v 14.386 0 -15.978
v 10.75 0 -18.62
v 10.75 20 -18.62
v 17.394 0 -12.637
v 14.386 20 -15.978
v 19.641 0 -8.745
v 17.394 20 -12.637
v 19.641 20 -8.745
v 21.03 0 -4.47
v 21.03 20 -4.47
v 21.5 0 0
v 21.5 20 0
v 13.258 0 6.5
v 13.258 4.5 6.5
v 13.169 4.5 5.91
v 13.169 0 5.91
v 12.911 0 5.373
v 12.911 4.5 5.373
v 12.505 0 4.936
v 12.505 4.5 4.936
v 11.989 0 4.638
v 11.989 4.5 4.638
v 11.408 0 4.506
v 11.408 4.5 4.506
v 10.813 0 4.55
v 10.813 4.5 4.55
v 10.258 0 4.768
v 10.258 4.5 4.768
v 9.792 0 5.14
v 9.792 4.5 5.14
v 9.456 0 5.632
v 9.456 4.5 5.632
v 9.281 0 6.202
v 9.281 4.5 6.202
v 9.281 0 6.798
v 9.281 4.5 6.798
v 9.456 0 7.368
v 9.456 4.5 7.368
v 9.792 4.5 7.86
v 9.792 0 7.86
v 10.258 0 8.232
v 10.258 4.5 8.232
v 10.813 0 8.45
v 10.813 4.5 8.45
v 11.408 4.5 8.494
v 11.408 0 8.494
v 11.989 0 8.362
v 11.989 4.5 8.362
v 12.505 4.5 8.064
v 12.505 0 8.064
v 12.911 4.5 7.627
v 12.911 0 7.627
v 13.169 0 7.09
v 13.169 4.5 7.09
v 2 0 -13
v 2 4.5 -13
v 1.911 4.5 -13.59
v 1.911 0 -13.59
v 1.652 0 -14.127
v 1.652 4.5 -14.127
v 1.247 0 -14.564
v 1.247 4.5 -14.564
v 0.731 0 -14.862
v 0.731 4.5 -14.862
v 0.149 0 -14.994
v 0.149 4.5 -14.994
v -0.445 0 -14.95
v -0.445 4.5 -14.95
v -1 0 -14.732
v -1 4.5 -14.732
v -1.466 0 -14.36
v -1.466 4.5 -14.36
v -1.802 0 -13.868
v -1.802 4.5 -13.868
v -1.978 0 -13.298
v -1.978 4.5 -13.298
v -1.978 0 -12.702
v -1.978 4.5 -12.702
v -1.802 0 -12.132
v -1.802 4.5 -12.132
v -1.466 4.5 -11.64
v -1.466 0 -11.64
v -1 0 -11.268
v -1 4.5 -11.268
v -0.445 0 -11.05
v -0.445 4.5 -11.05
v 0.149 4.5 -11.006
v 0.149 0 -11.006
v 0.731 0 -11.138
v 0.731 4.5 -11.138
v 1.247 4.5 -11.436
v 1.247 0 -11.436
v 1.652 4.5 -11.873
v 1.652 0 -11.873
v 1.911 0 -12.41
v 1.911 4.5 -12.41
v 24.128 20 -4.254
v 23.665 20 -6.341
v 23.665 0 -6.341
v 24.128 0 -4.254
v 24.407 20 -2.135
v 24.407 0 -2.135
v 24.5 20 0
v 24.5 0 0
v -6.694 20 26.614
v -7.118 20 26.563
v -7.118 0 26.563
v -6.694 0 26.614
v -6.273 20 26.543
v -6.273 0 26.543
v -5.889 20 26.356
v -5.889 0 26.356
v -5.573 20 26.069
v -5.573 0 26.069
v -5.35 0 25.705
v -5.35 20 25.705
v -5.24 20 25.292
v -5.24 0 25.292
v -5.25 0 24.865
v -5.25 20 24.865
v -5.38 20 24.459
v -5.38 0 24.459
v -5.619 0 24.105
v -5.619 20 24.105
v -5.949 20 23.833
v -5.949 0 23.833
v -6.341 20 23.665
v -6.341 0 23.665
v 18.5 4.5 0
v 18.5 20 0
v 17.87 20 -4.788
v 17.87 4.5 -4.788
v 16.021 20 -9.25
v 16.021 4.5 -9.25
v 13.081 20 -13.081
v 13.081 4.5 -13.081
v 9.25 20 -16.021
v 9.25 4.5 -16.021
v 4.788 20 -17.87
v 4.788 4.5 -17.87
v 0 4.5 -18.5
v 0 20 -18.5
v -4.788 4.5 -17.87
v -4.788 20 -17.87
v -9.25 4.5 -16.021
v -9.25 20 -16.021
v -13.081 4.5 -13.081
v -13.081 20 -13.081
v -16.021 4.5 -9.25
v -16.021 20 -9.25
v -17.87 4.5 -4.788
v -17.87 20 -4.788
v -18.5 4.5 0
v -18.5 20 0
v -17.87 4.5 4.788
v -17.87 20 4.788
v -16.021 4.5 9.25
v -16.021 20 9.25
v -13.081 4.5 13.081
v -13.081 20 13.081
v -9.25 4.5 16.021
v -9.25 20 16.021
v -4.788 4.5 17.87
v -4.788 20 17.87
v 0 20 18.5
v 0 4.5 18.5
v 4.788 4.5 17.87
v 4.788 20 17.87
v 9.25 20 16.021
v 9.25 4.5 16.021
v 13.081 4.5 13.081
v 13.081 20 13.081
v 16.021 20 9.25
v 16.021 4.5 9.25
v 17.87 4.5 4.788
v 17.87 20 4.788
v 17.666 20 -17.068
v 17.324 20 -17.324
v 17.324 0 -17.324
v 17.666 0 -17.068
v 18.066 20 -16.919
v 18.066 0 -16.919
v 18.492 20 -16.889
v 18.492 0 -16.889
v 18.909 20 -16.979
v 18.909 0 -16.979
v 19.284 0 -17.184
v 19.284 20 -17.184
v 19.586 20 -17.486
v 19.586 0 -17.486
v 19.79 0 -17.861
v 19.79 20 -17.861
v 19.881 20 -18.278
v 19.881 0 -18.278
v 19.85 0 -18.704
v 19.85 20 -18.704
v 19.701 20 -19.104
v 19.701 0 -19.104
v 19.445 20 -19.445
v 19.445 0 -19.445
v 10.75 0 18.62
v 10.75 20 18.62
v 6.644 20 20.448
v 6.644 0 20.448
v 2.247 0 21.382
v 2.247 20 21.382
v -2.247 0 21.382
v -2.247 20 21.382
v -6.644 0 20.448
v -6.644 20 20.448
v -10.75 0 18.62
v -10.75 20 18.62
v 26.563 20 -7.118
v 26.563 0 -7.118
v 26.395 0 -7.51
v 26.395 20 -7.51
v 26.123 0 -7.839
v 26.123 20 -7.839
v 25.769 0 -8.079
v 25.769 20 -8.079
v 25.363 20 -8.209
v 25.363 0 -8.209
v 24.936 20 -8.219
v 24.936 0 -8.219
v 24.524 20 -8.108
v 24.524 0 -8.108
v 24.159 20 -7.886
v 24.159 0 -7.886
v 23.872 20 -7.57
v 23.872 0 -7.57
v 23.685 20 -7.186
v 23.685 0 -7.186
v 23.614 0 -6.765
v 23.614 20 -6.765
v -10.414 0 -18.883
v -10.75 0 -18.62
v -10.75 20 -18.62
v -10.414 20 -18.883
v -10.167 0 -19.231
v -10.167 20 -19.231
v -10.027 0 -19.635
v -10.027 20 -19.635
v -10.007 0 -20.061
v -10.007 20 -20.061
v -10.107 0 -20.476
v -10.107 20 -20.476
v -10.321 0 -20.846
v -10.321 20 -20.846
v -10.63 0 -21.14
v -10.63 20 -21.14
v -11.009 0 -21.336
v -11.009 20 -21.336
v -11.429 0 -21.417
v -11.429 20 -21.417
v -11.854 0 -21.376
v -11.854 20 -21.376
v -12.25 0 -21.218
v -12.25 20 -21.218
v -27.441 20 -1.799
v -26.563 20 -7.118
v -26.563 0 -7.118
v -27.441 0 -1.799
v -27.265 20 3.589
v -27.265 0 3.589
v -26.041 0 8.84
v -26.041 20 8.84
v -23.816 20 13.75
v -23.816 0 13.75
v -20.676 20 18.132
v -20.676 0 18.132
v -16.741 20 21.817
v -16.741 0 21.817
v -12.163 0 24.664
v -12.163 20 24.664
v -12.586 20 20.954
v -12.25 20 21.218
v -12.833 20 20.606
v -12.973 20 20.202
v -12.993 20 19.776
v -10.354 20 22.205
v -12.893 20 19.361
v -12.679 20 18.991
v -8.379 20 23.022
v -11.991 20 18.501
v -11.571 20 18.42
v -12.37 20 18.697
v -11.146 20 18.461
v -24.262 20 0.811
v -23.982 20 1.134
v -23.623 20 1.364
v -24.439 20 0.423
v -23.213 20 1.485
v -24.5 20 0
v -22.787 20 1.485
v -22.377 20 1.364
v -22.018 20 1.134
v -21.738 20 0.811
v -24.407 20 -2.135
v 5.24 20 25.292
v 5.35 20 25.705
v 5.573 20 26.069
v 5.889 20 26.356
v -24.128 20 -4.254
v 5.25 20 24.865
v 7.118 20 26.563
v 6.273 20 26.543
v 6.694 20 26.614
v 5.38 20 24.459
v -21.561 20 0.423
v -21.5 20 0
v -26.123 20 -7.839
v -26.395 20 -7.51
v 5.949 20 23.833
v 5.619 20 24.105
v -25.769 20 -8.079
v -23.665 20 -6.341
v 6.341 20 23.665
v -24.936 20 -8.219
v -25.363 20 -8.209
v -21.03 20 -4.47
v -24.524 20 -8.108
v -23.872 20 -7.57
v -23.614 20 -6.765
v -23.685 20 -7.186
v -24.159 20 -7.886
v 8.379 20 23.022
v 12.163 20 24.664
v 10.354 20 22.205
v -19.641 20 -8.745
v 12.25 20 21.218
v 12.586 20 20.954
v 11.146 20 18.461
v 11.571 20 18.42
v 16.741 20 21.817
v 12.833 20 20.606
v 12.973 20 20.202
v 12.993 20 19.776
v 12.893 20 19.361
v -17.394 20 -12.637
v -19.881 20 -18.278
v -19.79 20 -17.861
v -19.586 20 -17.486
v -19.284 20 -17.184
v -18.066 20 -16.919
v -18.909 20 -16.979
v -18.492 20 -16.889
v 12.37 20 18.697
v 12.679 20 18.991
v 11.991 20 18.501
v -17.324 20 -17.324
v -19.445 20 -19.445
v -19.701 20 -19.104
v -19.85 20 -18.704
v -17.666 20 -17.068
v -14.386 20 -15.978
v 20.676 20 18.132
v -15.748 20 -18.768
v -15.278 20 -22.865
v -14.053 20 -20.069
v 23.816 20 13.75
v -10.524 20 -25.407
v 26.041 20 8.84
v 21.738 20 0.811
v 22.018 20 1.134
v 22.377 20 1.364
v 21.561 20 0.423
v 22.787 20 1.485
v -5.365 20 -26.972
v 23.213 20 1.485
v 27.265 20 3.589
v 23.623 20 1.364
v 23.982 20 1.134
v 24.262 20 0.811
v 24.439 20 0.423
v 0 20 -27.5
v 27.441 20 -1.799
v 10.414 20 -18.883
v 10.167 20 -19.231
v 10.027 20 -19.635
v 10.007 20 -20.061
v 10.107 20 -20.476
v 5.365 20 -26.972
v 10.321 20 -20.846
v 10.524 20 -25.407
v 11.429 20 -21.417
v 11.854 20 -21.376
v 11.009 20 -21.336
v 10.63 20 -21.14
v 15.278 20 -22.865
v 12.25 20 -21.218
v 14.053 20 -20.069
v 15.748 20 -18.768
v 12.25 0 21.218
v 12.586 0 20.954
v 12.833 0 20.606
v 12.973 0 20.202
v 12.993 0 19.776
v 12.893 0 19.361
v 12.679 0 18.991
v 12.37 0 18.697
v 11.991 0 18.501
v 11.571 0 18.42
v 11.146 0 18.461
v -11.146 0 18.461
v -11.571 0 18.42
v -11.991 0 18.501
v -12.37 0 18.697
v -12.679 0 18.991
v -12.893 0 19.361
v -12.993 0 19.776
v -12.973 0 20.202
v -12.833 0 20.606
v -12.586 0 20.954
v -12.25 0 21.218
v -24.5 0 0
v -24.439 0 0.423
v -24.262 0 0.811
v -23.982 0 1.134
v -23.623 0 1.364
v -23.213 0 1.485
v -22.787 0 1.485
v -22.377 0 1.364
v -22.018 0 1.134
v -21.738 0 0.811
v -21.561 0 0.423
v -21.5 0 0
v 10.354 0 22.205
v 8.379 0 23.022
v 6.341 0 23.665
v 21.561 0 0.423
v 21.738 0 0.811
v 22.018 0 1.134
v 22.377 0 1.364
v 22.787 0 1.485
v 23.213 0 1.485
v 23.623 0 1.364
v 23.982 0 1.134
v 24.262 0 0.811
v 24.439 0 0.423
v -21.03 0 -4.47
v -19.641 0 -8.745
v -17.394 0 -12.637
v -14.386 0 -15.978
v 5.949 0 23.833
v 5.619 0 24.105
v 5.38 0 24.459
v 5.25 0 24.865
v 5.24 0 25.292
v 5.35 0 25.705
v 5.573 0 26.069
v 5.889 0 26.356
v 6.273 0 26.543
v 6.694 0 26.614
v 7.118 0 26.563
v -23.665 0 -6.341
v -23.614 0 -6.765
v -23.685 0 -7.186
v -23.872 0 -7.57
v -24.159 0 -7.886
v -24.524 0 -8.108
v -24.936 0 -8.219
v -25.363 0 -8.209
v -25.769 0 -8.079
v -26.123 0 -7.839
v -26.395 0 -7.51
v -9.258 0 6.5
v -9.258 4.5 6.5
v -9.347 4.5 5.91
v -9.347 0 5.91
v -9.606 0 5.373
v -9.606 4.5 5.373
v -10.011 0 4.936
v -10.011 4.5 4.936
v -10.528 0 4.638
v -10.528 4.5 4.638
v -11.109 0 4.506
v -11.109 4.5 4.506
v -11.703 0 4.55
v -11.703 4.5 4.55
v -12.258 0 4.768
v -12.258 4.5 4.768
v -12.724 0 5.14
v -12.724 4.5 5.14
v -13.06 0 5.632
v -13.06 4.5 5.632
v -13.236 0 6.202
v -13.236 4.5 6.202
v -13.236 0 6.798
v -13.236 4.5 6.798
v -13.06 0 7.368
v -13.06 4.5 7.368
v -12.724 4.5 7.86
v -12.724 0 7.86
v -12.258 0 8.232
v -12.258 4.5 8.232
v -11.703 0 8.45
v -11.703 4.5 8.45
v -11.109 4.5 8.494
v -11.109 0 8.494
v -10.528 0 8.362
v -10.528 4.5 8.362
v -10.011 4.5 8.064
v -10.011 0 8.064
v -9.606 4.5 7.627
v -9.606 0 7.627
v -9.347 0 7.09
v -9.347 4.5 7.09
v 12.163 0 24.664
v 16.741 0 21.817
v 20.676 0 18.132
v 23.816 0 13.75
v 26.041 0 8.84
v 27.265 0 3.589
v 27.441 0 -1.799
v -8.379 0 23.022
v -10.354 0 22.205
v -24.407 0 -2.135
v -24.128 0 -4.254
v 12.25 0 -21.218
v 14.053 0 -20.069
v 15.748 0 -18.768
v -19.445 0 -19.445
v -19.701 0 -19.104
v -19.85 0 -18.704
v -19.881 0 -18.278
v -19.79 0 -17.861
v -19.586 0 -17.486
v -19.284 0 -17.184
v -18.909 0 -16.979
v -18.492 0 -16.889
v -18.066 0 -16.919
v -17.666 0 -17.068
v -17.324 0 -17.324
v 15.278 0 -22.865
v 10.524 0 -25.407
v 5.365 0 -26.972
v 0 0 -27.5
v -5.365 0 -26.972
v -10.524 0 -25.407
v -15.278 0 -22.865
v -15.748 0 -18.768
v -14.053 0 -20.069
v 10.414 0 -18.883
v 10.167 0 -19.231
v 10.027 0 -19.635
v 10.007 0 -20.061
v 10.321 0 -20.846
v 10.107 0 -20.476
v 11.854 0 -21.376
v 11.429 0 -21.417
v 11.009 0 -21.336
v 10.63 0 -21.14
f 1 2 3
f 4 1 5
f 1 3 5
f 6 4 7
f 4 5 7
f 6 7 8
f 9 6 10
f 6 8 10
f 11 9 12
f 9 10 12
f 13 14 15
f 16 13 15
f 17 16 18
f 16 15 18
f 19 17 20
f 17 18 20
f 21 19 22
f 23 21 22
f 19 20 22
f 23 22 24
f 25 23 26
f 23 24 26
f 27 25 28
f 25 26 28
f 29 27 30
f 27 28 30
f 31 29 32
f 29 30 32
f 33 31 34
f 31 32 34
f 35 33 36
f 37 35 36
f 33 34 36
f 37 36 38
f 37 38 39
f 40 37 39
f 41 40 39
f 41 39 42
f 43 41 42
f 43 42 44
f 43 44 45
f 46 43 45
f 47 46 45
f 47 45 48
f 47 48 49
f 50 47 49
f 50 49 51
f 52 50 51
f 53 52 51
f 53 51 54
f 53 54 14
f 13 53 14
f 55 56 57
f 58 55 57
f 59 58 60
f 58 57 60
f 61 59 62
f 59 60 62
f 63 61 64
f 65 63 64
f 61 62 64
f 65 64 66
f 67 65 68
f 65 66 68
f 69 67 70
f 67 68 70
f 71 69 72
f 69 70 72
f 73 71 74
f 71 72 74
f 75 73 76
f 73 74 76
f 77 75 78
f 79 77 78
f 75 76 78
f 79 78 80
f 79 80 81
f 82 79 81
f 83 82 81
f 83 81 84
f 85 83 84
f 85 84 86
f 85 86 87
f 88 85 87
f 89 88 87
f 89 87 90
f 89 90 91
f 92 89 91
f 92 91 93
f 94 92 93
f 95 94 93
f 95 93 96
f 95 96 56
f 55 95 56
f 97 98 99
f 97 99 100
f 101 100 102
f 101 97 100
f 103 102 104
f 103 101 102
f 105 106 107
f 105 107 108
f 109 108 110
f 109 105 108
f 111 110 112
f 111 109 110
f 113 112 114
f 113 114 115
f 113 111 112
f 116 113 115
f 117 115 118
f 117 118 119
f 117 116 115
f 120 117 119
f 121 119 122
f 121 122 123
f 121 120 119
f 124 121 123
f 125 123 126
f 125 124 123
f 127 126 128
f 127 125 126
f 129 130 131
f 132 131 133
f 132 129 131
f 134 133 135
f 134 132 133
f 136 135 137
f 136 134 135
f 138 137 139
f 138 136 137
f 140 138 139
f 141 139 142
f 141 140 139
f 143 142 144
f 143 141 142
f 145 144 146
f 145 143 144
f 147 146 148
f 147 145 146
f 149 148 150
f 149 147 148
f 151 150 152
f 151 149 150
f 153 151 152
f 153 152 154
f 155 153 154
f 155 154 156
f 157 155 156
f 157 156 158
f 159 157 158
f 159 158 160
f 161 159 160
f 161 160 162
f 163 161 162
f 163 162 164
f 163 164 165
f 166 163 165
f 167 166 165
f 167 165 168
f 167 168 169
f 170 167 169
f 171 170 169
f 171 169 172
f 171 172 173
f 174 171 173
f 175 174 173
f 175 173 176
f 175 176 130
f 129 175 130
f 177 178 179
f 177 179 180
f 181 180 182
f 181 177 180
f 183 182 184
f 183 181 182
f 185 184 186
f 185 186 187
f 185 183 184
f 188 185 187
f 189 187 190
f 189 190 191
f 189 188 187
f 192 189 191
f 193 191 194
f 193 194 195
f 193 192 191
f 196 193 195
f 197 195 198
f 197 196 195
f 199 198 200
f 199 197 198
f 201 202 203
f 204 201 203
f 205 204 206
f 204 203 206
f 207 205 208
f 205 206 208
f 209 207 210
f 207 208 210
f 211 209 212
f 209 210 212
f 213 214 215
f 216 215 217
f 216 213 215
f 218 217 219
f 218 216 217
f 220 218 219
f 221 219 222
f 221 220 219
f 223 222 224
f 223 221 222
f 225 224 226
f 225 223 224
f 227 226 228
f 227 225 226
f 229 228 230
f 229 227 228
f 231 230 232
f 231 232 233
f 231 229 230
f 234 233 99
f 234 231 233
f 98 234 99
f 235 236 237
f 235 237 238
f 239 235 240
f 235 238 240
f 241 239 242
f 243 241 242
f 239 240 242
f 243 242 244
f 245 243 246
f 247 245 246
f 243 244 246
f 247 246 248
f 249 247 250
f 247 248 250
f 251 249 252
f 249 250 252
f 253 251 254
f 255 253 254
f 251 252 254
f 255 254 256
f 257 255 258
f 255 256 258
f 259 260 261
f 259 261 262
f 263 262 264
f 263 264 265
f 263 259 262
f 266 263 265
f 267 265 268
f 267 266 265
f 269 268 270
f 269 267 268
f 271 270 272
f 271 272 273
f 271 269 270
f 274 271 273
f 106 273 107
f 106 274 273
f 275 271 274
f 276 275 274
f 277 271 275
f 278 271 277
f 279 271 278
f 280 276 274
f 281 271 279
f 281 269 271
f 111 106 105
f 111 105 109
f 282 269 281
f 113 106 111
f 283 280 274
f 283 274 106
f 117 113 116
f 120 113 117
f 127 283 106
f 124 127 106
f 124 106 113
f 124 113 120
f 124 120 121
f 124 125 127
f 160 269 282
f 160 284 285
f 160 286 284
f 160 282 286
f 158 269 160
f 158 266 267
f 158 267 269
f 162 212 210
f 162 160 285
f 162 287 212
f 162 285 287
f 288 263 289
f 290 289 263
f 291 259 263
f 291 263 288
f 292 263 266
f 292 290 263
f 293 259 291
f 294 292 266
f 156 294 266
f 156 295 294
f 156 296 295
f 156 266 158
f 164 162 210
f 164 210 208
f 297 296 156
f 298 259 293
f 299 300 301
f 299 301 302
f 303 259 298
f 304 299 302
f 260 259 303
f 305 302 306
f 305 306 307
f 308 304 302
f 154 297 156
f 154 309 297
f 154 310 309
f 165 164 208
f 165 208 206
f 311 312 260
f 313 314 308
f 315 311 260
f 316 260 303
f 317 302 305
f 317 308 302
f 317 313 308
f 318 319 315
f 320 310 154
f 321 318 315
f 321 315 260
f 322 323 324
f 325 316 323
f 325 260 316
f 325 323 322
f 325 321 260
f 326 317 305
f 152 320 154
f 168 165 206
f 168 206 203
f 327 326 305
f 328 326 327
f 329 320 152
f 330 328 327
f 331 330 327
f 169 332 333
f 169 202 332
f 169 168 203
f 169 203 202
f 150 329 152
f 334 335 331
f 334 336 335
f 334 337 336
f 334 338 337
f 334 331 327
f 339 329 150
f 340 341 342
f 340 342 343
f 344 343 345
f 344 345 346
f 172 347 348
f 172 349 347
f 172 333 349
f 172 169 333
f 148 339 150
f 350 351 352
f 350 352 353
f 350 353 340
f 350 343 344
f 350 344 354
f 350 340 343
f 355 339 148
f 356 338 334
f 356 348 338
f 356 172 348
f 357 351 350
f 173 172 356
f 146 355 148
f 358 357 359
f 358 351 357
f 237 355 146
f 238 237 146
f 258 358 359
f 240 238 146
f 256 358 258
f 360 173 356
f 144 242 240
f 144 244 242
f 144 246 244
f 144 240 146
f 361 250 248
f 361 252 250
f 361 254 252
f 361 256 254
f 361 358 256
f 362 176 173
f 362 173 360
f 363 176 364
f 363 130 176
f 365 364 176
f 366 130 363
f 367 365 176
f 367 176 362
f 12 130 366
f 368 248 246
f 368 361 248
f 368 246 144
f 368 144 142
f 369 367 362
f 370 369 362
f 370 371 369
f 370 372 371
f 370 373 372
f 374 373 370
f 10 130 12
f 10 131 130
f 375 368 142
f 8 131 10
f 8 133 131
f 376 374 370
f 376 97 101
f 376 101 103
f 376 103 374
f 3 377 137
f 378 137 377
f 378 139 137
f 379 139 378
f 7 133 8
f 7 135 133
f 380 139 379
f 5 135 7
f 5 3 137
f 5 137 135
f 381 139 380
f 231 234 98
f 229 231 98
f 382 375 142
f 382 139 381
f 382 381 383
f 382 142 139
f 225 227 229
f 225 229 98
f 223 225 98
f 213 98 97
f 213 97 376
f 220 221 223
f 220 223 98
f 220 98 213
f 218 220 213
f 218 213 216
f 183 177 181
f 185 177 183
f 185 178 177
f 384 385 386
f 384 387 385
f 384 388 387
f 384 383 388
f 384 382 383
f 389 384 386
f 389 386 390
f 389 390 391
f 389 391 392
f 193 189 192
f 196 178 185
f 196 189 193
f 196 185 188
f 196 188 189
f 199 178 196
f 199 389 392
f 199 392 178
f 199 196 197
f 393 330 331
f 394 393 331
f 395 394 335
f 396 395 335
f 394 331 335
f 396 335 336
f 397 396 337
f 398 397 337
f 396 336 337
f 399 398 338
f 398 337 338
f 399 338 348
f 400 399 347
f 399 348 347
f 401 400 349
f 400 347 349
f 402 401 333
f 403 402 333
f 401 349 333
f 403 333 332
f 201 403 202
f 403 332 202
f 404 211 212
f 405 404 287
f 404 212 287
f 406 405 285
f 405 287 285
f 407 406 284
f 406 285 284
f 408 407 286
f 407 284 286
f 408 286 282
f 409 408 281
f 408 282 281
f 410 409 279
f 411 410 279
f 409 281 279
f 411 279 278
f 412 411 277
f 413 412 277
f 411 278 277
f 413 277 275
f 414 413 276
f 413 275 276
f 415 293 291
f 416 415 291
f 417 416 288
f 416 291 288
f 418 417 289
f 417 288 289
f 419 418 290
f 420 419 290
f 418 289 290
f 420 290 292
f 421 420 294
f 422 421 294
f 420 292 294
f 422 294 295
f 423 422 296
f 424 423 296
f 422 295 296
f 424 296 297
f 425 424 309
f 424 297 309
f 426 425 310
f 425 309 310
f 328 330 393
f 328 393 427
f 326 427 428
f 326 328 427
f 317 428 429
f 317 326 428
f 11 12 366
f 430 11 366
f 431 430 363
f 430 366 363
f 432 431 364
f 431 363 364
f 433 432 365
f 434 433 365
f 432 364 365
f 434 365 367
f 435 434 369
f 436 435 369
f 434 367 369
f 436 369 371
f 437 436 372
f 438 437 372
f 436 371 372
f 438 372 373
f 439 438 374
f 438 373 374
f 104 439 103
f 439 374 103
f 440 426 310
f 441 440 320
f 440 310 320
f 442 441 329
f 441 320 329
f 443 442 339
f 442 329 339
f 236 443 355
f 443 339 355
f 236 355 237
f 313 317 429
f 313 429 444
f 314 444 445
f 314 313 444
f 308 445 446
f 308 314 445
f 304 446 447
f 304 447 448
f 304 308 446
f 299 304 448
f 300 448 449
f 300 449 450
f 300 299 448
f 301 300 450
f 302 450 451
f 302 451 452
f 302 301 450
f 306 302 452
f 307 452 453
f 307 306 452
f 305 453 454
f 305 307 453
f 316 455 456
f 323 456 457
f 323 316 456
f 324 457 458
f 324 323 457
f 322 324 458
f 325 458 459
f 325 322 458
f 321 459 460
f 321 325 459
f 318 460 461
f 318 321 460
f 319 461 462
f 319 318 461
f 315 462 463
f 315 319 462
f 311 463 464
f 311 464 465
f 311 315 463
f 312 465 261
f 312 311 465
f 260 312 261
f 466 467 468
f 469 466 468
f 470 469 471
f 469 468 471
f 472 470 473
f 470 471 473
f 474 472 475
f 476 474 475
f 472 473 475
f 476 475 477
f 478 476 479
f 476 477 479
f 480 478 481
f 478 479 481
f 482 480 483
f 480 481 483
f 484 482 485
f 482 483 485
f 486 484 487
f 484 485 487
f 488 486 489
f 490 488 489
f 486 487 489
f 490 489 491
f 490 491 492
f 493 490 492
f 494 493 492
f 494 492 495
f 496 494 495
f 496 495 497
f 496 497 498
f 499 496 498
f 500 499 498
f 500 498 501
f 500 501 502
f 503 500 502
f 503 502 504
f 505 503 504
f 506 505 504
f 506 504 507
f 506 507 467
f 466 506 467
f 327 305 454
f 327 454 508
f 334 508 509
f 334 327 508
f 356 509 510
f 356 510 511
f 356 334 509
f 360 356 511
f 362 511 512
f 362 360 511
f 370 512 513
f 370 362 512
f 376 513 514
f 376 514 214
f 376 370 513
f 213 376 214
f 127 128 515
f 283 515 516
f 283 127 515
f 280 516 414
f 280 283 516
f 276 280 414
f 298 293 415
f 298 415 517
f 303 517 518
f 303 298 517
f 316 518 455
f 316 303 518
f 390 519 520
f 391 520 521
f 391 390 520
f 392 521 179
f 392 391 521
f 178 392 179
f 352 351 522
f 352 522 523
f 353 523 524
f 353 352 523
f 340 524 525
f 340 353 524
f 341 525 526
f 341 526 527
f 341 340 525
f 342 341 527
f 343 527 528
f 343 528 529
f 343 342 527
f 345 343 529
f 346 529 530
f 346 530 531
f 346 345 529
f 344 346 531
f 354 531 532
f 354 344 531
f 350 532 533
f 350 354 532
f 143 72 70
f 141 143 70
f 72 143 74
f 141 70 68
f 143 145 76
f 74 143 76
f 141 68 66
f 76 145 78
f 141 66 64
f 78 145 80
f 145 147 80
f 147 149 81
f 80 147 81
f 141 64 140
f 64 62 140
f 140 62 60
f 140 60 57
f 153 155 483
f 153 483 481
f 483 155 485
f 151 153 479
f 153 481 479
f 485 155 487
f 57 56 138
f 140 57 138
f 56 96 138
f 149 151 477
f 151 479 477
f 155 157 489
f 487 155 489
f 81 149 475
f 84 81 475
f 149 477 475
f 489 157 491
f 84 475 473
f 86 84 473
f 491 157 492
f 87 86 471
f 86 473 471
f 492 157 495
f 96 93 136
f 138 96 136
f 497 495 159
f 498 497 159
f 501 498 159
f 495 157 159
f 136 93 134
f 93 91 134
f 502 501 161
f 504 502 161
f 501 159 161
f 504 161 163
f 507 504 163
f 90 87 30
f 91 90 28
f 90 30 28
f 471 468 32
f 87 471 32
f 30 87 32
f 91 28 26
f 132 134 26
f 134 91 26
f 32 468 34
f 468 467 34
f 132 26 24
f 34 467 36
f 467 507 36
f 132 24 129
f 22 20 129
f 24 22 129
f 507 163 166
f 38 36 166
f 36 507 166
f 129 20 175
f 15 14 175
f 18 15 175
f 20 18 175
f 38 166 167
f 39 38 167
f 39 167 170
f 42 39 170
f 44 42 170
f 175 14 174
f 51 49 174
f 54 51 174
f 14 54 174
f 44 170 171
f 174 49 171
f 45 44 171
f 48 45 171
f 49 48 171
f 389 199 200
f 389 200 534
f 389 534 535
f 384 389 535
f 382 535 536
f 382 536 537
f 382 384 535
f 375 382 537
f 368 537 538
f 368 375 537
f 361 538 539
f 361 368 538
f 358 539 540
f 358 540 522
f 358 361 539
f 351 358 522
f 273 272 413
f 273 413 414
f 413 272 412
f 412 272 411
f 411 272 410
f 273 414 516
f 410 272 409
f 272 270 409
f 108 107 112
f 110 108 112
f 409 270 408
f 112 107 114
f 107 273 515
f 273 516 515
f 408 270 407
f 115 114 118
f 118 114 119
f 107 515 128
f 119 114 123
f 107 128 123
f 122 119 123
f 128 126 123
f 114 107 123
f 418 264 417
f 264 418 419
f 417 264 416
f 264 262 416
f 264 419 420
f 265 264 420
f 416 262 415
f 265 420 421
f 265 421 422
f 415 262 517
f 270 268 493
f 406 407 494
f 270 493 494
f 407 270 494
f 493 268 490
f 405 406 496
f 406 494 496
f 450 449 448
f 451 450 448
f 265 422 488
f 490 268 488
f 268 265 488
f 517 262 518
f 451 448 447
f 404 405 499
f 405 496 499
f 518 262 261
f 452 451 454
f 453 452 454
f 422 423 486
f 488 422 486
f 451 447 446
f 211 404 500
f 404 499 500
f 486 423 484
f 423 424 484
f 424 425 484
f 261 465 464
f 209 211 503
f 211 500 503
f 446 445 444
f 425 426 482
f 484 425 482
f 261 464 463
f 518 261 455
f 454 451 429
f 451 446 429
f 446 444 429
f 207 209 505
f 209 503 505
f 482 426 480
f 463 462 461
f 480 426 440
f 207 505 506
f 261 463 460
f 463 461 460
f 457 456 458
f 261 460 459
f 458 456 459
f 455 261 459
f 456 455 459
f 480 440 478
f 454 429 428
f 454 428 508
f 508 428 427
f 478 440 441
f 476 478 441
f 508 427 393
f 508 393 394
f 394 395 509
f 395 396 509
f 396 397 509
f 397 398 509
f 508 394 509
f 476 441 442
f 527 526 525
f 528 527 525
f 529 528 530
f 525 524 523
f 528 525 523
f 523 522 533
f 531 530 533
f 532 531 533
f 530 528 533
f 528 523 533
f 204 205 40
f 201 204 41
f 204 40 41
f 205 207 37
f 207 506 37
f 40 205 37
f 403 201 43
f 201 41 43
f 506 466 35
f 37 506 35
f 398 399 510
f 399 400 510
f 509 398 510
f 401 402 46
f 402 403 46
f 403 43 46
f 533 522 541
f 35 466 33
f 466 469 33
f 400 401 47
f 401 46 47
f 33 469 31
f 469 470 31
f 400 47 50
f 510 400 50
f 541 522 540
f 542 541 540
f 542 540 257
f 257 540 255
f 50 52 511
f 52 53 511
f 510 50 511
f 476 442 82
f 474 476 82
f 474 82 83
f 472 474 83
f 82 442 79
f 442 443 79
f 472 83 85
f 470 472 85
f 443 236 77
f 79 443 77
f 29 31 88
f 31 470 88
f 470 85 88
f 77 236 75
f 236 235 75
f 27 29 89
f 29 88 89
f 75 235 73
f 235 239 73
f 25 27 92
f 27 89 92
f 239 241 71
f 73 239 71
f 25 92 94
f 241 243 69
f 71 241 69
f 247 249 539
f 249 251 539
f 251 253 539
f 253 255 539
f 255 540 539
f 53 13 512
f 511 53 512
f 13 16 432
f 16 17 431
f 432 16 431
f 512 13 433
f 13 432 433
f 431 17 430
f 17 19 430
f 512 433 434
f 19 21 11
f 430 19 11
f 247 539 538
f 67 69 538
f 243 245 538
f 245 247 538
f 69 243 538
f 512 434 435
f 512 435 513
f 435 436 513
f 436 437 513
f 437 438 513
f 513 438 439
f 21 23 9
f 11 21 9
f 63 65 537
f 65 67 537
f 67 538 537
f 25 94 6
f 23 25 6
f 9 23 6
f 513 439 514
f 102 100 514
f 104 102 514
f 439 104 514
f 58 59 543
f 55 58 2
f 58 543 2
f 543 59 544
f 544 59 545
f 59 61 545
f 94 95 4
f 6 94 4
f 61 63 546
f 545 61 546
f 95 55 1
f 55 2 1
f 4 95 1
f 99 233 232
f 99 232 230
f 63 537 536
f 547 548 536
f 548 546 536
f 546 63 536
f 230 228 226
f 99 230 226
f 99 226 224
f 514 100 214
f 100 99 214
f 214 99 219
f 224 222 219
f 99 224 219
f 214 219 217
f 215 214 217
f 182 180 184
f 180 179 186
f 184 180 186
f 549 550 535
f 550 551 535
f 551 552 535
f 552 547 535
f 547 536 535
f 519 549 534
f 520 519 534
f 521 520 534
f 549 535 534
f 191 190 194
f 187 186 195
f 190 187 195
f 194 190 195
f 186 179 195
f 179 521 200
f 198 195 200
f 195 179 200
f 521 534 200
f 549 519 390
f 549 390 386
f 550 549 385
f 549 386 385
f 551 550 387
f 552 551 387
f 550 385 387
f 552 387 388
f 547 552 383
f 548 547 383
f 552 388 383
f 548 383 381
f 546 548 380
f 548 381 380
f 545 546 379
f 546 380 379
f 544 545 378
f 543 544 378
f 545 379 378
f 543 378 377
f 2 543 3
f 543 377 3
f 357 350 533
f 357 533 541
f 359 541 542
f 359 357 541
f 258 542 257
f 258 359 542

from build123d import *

# Parameters (mm, degrees)
ESQUISSE1_R             = 24.5
ESQUISSE1_R_2           = 18.5
BOSS_EXTRU_1_DEPTH      = 20
ENL_V_MAT_EXTRU_1_DEPTH = 21
BOSS_EXTRU_2_DEPTH      = 20
ESQUISSE4_R             = 21.5
BOSS_EXTRU_3_DEPTH      = 4.5
ENL_V_MAT_EXTRU_2_REACH = 6.5
ESQUISSE5_R             = 2


with BuildPart() as part:
    # Esquisse1 → Boss.-Extru.1 (new body)
    with BuildSketch(Plane(origin=(0, 0, 0), x_dir=(1, 0, 0), z_dir=(0, 1, 0))):
        Circle(ESQUISSE1_R)
        Circle(ESQUISSE1_R_2, mode=Mode.SUBTRACT)
    extrude(amount=BOSS_EXTRU_1_DEPTH)

    # Esquisse2 → Enlèv. mat.-Extru.1 (cut, through all)
    with BuildSketch(Plane(origin=(0, 20, 0), x_dir=(1, 0, 0), z_dir=(0, 1, 0))):
        with BuildLine():
            ThreePointArc((-12.25, 21.217622393), (-21.217622393, 12.25), (-24.5, 0))
            ThreePointArc((-24.5, 0), (-23, -1.5), (-21.5, 0))
            ThreePointArc((-21.5, 0), (-18.619546181, 10.75), (-10.75, 18.619546181))
            ThreePointArc((-10.75, 18.619546181), (-10.200961894, 20.668584287), (-12.25, 21.217622393))
        make_face()
        with BuildLine():
            ThreePointArc((24.5, 0), (21.217622393, 12.25), (12.25, 21.217622393))
            ThreePointArc((12.25, 21.217622393), (10.200961894, 20.668584287), (10.75, 18.619546181))
            ThreePointArc((10.75, 18.619546181), (18.619546181, 10.75), (21.5, 0))
            ThreePointArc((21.5, 0), (23, -1.5), (24.5, 0))
        make_face()
        with BuildLine():
            ThreePointArc((-12.25, -21.217622393), (0, -24.5), (12.25, -21.217622393))
            ThreePointArc((12.25, -21.217622393), (12.799038106, -19.168584287), (10.75, -18.619546181))
            ThreePointArc((10.75, -18.619546181), (0, -21.5), (-10.75, -18.619546181))
            ThreePointArc((-10.75, -18.619546181), (-12.799038106, -19.168584287), (-12.25, -21.217622393))
        make_face()
    extrude(amount=-ENL_V_MAT_EXTRU_1_DEPTH, mode=Mode.SUBTRACT)

    # Esquisse3 → Boss.-Extru.2 (add)
    with BuildSketch(Plane(origin=(0, 20, 0), x_dir=(1, 0, 0), z_dir=(0, 1, 0))):
        with BuildLine():
            ThreePointArc((19.445436483, 19.445436483), (0, 27.5), (-19.445436483, 19.445436483))
            ThreePointArc((-19.445436483, 19.445436483), (-19.445436483, 17.324116139), (-17.324116139, 17.324116139))
            ThreePointArc((-17.324116139, 17.324116139), (0, 24.5), (17.324116139, 17.324116139))
            ThreePointArc((17.324116139, 17.324116139), (19.445436483, 17.324116139), (19.445436483, 19.445436483))
        make_face()
        with BuildLine():
            ThreePointArc((7.11752374, -26.562960223), (23.815698604, -13.75), (26.562960223, 7.11752374))
            ThreePointArc((26.562960223, 7.11752374), (24.725842916, 8.178183912), (23.665182744, 6.341066605))
            ThreePointArc((23.665182744, 6.341066605), (21.217622393, -12.25), (6.341066605, -23.665182744))
            ThreePointArc((6.341066605, -23.665182744), (5.280406433, -25.502300051), (7.11752374, -26.562960223))
        make_face()
        with BuildLine():
            ThreePointArc((-26.562960223, 7.11752374), (-23.815698604, -13.75), (-7.11752374, -26.562960223))
            ThreePointArc((-7.11752374, -26.562960223), (-5.280406433, -25.502300051), (-6.341066605, -23.665182744))
            ThreePointArc((-6.341066605, -23.665182744), (-21.217622393, -12.25), (-23.665182744, 6.341066605))
            ThreePointArc((-23.665182744, 6.341066605), (-24.725842916, 8.178183912), (-26.562960223, 7.11752374))
        make_face()
    extrude(amount=-BOSS_EXTRU_2_DEPTH)

    # Esquisse4 → Boss.-Extru.3 (add)
    with BuildSketch(Plane.XZ):
        Circle(ESQUISSE4_R)
    extrude(amount=-BOSS_EXTRU_3_DEPTH)

    # Esquisse5 → Enlèv. mat.-Extru.2 (cut, up to next)
    with BuildSketch(Plane(origin=(0, 4.5, 0), x_dir=(1, 0, 0), z_dir=(0, 1, 0)), mode=Mode.PRIVATE) as enl_v_mat_extru_2_sk1:
        with Locations((0, 13)):
            Circle(ESQUISSE5_R)
    enl_v_mat_extru_2_tool1 = extrude(enl_v_mat_extru_2_sk1.sketch, amount=-ENL_V_MAT_EXTRU_2_REACH, mode=Mode.PRIVATE) & part.part
    add(enl_v_mat_extru_2_tool1.solids().sort_by_distance((0, 4.5, -13))[0], mode=Mode.SUBTRACT)
    # Esquisse5 → Enlèv. mat.-Extru.2 (cut, up to next)
    with BuildSketch(Plane(origin=(0, 4.5, 0), x_dir=(1, 0, 0), z_dir=(0, 1, 0)), mode=Mode.PRIVATE) as enl_v_mat_extru_2_sk2:
        with Locations((11.258330249, -6.5)):
            Circle(ESQUISSE5_R)
    enl_v_mat_extru_2_tool2 = extrude(enl_v_mat_extru_2_sk2.sketch, amount=-ENL_V_MAT_EXTRU_2_REACH, mode=Mode.PRIVATE) & part.part
    add(enl_v_mat_extru_2_tool2.solids().sort_by_distance((11.25833, 4.5, 6.5))[0], mode=Mode.SUBTRACT)
    # Esquisse5 → Enlèv. mat.-Extru.2 (cut, up to next)
    with BuildSketch(Plane(origin=(0, 4.5, 0), x_dir=(1, 0, 0), z_dir=(0, 1, 0)), mode=Mode.PRIVATE) as enl_v_mat_extru_2_sk3:
        with Locations((-11.258330249, -6.5)):
            Circle(ESQUISSE5_R)
    enl_v_mat_extru_2_tool3 = extrude(enl_v_mat_extru_2_sk3.sketch, amount=-ENL_V_MAT_EXTRU_2_REACH, mode=Mode.PRIVATE) & part.part
    add(enl_v_mat_extru_2_tool3.solids().sort_by_distance((-11.25833, 4.5, 6.5))[0], mode=Mode.SUBTRACT)


solid = part.part
